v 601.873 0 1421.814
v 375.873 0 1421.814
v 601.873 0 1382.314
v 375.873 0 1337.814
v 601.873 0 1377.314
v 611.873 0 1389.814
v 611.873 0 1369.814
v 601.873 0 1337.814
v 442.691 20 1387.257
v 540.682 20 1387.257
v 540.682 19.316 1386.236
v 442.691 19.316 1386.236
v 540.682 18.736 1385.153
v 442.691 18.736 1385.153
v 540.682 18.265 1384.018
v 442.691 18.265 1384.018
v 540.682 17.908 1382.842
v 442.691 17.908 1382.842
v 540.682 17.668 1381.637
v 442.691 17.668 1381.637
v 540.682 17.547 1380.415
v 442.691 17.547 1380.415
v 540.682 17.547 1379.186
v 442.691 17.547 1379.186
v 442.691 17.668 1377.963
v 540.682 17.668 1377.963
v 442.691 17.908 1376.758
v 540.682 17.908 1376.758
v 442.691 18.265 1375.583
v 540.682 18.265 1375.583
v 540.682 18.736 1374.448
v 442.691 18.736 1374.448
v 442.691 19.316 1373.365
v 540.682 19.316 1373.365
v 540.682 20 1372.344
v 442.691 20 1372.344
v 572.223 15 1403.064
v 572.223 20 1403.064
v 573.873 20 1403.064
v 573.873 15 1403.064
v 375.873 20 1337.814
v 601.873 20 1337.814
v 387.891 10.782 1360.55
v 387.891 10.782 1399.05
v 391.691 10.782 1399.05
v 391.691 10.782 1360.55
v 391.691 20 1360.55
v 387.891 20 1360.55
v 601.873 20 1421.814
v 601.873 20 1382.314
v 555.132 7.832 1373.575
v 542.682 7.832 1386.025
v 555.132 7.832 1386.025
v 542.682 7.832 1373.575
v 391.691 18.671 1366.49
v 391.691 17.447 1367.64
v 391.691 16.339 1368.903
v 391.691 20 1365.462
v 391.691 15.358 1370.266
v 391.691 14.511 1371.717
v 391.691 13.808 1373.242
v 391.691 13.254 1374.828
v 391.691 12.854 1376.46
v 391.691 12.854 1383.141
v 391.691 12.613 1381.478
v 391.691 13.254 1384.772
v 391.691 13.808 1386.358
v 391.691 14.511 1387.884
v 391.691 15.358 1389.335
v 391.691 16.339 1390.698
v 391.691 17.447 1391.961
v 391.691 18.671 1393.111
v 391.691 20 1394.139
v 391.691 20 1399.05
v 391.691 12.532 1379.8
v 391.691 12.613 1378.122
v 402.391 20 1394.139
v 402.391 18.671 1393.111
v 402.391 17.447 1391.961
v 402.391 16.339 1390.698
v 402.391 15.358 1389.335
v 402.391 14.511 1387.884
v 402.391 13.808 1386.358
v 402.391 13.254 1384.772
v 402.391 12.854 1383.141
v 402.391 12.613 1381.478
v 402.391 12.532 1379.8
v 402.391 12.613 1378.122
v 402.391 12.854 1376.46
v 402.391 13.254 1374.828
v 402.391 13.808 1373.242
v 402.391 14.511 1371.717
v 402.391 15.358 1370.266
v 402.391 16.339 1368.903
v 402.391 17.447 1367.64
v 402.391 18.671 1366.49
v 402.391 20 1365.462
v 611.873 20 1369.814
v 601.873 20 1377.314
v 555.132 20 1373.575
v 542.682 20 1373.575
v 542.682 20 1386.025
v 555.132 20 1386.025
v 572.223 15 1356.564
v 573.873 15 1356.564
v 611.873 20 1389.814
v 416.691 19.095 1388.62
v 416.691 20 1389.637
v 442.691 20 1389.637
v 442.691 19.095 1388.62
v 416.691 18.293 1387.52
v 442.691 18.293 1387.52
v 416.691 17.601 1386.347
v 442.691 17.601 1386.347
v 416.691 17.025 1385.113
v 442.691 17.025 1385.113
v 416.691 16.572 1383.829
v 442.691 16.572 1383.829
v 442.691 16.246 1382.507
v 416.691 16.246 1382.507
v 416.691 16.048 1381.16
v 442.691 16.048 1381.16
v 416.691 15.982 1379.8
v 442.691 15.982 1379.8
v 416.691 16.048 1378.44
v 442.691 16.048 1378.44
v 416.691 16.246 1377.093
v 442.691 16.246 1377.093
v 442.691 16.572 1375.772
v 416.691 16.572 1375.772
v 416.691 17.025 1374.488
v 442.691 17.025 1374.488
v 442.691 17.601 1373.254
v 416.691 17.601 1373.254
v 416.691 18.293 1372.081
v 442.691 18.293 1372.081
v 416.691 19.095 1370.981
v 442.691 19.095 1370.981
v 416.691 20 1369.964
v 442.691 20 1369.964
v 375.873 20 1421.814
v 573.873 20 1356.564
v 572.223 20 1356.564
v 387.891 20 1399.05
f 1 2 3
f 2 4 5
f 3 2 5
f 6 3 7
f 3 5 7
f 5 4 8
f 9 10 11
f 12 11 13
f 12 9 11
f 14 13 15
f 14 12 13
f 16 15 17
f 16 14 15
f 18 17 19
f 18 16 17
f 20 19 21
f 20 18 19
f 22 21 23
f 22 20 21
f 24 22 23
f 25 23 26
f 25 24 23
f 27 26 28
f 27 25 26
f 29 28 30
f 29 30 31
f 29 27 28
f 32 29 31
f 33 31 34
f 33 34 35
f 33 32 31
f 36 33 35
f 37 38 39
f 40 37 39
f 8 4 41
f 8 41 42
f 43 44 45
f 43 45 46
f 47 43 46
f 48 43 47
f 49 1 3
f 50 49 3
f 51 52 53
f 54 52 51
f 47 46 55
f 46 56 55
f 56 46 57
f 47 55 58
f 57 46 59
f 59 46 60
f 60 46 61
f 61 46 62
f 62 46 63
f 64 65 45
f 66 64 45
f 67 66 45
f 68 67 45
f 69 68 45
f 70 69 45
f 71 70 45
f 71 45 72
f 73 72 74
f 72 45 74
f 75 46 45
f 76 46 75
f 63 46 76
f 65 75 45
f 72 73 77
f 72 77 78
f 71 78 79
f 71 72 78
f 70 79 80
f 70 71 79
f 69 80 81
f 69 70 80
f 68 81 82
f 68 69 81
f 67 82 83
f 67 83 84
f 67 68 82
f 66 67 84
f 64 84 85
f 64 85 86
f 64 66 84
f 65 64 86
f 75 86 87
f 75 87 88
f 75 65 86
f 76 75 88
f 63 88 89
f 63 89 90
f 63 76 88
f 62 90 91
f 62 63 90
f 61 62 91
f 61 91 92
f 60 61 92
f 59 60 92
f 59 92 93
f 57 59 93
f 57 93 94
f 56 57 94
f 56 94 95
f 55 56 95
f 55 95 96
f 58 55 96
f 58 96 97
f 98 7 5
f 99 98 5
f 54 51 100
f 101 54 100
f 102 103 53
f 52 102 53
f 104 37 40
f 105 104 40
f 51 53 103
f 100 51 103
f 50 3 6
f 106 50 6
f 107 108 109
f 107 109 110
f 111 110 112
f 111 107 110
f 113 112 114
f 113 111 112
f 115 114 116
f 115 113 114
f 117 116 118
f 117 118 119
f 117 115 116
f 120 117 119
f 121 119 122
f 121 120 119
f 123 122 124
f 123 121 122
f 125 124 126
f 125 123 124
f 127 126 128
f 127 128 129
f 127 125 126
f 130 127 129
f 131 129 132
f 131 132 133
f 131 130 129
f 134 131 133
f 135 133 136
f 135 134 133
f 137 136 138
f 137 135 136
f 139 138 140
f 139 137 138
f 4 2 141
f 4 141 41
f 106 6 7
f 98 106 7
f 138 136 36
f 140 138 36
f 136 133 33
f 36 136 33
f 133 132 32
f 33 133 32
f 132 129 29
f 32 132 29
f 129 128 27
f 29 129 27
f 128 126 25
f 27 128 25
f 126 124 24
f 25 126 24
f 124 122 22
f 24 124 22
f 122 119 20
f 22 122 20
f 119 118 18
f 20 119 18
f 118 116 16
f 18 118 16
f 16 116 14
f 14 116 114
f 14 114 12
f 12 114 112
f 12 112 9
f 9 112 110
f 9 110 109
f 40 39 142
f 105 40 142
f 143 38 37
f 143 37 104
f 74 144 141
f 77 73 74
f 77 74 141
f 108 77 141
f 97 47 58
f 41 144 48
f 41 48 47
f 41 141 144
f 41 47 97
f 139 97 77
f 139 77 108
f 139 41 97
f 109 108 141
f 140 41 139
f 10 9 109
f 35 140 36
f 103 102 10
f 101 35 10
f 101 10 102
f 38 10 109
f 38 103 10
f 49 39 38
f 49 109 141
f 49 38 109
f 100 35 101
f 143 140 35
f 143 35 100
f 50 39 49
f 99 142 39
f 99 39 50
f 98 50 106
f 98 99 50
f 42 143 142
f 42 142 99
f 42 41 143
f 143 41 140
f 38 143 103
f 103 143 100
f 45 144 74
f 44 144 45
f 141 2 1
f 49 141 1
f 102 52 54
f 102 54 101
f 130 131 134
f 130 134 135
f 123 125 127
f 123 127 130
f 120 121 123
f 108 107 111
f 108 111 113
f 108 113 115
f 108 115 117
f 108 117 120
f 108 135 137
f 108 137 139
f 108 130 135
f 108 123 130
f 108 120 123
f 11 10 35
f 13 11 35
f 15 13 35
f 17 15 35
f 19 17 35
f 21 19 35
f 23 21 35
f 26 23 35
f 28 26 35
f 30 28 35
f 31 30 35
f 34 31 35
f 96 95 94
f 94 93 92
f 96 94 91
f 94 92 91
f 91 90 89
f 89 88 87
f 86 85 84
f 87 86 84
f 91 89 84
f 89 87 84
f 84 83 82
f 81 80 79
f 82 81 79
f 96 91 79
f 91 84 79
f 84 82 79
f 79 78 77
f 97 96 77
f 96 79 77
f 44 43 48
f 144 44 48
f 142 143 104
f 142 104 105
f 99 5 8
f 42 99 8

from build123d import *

# Parameters (mm, degrees)
SKETCH1_W           = 226
SKETCH1_H           = 84
BOSS_EXTRUDE1_DEPTH = 20
BOSS_EXTRUDE2_DEPTH = 20
SKETCH4_W           = 1.65
SKETCH4_H           = 46.5
BOSS_EXTRUDE3_DEPTH = 5
SKETCH4_2_W         = 1.65
SKETCH4_2_H         = 46.5
CUT_EXTRUDE1_DEPTH  = 5
CAVITY2_START       = 416.690531323
CAVITY2_DEPTH       = 123.991681054
CAVITY2_START_2     = 387.890531323
CAVITY2_2_DEPTH     = 14.5
CAVITY2_3_DEPTH     = 3.8
CAVITY2_4_DEPTH     = 26
CAVITY2_START_3     = 542.682212377
CAVITY2_5_DEPTH     = 12.45
CAVITY2_6_OUTLINE_W = 10.967659298
CAVITY2_6_OUTLINE_H = 10.05
CAVITY2_6_DEPTH     = 1.2
CAVITY2_START_4     = 553.932212377
CAVITY2_7_OUTLINE_W = 10.967659298
CAVITY2_7_OUTLINE_H = 10.05
CAVITY2_7_DEPTH     = 1.2
SKETCH7_W           = 10.05
SKETCH7_H           = 10.05
CUT_EXTRUDE2_DEPTH  = 12


# Read off the part's stored shape, not the designer's step: Cavity2
with BuildPart() as part:
    # Sketch1 → Boss-Extrude1 (new body)
    with BuildSketch(Plane(origin=(375.872687737, 0, 1298.443562055), x_dir=(1, 0, 0), z_dir=(0, 1, 0))):
        with Locations((113, -81.370523073)):
            Rectangle(SKETCH1_W, SKETCH1_H)
    extrude(amount=BOSS_EXTRUDE1_DEPTH)

    # Sketch2 → Boss-Extrude2 (add)
    with BuildSketch(Plane.XZ):
        Polygon((601.872687737, 1377.314085128), (601.872687737, 1382.314085128), (611.872687737, 1389.814085128), (611.872687737, 1369.814085128), align=None)
    extrude(amount=-BOSS_EXTRUDE2_DEPTH)

    # Sketch4 → Boss-Extrude3 (add)
    with BuildSketch(Plane(origin=(0, 20, 0), x_dir=(1, 0, 0), z_dir=(0, 1, 0))):
        with Locations((573.047687737, -1379.814085128)):
            Rectangle(SKETCH4_W, SKETCH4_H)
    extrude(amount=-BOSS_EXTRUDE3_DEPTH)

    # Sketch4<2> → Cut-Extrude1 (cut)
    with BuildSketch(Plane(origin=(0, 20, 0), x_dir=(1, 0, 0), z_dir=(0, 1, 0))):
        with Locations((573.047687737, -1379.814085128)):
            Rectangle(SKETCH4_2_W, SKETCH4_2_H)
    extrude(amount=-CUT_EXTRUDE1_DEPTH, mode=Mode.SUBTRACT)

    # Cavity2 outline → Cavity2 (cut)
    with BuildSketch(Plane.YZ.offset(CAVITY2_START)):
        with BuildLine():
            ThreePointArc((20, 1387.257061845), (17.532340702, 1379.800377592), (20, 1372.34369334))
            Line((20, 1372.34369334), (20, 1387.257061845))
        make_face()
    extrude(amount=CAVITY2_DEPTH, mode=Mode.SUBTRACT)

    # Cavity2 2 outline → Cavity2 2 (cut)
    with BuildSketch(Plane.YZ.offset(CAVITY2_START_2)):
        with BuildLine():
            ThreePointArc((20, 1394.13921088), (12.532340702, 1379.800377593), (20, 1365.461544305))
            Line((20, 1365.461544305), (20, 1394.13921088))
        make_face()
    extrude(amount=CAVITY2_2_DEPTH, mode=Mode.SUBTRACT)

    # Cavity2 3 outline → Cavity2 3 (cut)
    with BuildSketch(Plane.YZ.offset(CAVITY2_START_2)):
        with BuildLine():
            Line((20, 1394.13921088), (20, 1399.050377582))
            Line((20, 1399.050377582), (10.782340682, 1399.050377573))
            Line((10.782340682, 1399.050377573), (10.782340722, 1360.550377573))
            Line((10.782340722, 1360.550377573), (20, 1360.550377582))
            Line((20, 1360.550377582), (20, 1365.461544305))
            ThreePointArc((20, 1365.461544305), (12.532340702, 1379.800377593), (20, 1394.13921088))
        make_face()
    extrude(amount=CAVITY2_3_DEPTH, mode=Mode.SUBTRACT)

    # Cavity2 4 outline → Cavity2 4 (cut)
    with BuildSketch(Plane.YZ.offset(CAVITY2_START)):
        with BuildLine():
            Line((20, 1387.257061845), (20, 1389.636771243))
            ThreePointArc((20, 1389.636771243), (15.982340702, 1379.800377593), (20, 1369.963983943))
            Line((20, 1369.963983943), (20, 1372.34369334))
            ThreePointArc((20, 1372.34369334), (17.532340702, 1379.800377592), (20, 1387.257061845))
        make_face()
    extrude(amount=CAVITY2_4_DEPTH, mode=Mode.SUBTRACT)

    # Cavity2 5 outline → Cavity2 5 (cut)
    with BuildSketch(Plane.YZ.offset(CAVITY2_START_3)):
        Polygon((20, 1386.025377593), (7.832340702, 1386.025377593), (7.832340702, 1373.575377593), (20, 1373.575377593), (20, 1374.775377593), (9.032340702, 1374.775377593), (9.032340702, 1384.825377593), (20, 1384.825377593), align=None)
    extrude(amount=CAVITY2_5_DEPTH, mode=Mode.SUBTRACT)

    # Cavity2 6 outline → Cavity2 6 (cut)
    with BuildSketch(Plane.YZ.offset(CAVITY2_START_3)):
        with Locations((14.516170351, 1379.800377593)):
            Rectangle(CAVITY2_6_OUTLINE_W, CAVITY2_6_OUTLINE_H)
    extrude(amount=CAVITY2_6_DEPTH, mode=Mode.SUBTRACT)

    # Cavity2 7 outline → Cavity2 7 (cut)
    with BuildSketch(Plane.YZ.offset(CAVITY2_START_4)):
        with Locations((14.516170351, 1379.800377593)):
            Rectangle(CAVITY2_7_OUTLINE_W, CAVITY2_7_OUTLINE_H)
    extrude(amount=CAVITY2_7_DEPTH, mode=Mode.SUBTRACT)

    # Sketch7 → Cut-Extrude2 (cut)
    with BuildSketch(Plane(origin=(0, 20, 0), x_dir=(1, 0, 0), z_dir=(0, 1, 0))):
        with Locations((548.907212377, -1379.800377593)):
            Rectangle(SKETCH7_W, SKETCH7_H)
    extrude(amount=-CUT_EXTRUDE2_DEPTH, mode=Mode.SUBTRACT)


solid = part.part
